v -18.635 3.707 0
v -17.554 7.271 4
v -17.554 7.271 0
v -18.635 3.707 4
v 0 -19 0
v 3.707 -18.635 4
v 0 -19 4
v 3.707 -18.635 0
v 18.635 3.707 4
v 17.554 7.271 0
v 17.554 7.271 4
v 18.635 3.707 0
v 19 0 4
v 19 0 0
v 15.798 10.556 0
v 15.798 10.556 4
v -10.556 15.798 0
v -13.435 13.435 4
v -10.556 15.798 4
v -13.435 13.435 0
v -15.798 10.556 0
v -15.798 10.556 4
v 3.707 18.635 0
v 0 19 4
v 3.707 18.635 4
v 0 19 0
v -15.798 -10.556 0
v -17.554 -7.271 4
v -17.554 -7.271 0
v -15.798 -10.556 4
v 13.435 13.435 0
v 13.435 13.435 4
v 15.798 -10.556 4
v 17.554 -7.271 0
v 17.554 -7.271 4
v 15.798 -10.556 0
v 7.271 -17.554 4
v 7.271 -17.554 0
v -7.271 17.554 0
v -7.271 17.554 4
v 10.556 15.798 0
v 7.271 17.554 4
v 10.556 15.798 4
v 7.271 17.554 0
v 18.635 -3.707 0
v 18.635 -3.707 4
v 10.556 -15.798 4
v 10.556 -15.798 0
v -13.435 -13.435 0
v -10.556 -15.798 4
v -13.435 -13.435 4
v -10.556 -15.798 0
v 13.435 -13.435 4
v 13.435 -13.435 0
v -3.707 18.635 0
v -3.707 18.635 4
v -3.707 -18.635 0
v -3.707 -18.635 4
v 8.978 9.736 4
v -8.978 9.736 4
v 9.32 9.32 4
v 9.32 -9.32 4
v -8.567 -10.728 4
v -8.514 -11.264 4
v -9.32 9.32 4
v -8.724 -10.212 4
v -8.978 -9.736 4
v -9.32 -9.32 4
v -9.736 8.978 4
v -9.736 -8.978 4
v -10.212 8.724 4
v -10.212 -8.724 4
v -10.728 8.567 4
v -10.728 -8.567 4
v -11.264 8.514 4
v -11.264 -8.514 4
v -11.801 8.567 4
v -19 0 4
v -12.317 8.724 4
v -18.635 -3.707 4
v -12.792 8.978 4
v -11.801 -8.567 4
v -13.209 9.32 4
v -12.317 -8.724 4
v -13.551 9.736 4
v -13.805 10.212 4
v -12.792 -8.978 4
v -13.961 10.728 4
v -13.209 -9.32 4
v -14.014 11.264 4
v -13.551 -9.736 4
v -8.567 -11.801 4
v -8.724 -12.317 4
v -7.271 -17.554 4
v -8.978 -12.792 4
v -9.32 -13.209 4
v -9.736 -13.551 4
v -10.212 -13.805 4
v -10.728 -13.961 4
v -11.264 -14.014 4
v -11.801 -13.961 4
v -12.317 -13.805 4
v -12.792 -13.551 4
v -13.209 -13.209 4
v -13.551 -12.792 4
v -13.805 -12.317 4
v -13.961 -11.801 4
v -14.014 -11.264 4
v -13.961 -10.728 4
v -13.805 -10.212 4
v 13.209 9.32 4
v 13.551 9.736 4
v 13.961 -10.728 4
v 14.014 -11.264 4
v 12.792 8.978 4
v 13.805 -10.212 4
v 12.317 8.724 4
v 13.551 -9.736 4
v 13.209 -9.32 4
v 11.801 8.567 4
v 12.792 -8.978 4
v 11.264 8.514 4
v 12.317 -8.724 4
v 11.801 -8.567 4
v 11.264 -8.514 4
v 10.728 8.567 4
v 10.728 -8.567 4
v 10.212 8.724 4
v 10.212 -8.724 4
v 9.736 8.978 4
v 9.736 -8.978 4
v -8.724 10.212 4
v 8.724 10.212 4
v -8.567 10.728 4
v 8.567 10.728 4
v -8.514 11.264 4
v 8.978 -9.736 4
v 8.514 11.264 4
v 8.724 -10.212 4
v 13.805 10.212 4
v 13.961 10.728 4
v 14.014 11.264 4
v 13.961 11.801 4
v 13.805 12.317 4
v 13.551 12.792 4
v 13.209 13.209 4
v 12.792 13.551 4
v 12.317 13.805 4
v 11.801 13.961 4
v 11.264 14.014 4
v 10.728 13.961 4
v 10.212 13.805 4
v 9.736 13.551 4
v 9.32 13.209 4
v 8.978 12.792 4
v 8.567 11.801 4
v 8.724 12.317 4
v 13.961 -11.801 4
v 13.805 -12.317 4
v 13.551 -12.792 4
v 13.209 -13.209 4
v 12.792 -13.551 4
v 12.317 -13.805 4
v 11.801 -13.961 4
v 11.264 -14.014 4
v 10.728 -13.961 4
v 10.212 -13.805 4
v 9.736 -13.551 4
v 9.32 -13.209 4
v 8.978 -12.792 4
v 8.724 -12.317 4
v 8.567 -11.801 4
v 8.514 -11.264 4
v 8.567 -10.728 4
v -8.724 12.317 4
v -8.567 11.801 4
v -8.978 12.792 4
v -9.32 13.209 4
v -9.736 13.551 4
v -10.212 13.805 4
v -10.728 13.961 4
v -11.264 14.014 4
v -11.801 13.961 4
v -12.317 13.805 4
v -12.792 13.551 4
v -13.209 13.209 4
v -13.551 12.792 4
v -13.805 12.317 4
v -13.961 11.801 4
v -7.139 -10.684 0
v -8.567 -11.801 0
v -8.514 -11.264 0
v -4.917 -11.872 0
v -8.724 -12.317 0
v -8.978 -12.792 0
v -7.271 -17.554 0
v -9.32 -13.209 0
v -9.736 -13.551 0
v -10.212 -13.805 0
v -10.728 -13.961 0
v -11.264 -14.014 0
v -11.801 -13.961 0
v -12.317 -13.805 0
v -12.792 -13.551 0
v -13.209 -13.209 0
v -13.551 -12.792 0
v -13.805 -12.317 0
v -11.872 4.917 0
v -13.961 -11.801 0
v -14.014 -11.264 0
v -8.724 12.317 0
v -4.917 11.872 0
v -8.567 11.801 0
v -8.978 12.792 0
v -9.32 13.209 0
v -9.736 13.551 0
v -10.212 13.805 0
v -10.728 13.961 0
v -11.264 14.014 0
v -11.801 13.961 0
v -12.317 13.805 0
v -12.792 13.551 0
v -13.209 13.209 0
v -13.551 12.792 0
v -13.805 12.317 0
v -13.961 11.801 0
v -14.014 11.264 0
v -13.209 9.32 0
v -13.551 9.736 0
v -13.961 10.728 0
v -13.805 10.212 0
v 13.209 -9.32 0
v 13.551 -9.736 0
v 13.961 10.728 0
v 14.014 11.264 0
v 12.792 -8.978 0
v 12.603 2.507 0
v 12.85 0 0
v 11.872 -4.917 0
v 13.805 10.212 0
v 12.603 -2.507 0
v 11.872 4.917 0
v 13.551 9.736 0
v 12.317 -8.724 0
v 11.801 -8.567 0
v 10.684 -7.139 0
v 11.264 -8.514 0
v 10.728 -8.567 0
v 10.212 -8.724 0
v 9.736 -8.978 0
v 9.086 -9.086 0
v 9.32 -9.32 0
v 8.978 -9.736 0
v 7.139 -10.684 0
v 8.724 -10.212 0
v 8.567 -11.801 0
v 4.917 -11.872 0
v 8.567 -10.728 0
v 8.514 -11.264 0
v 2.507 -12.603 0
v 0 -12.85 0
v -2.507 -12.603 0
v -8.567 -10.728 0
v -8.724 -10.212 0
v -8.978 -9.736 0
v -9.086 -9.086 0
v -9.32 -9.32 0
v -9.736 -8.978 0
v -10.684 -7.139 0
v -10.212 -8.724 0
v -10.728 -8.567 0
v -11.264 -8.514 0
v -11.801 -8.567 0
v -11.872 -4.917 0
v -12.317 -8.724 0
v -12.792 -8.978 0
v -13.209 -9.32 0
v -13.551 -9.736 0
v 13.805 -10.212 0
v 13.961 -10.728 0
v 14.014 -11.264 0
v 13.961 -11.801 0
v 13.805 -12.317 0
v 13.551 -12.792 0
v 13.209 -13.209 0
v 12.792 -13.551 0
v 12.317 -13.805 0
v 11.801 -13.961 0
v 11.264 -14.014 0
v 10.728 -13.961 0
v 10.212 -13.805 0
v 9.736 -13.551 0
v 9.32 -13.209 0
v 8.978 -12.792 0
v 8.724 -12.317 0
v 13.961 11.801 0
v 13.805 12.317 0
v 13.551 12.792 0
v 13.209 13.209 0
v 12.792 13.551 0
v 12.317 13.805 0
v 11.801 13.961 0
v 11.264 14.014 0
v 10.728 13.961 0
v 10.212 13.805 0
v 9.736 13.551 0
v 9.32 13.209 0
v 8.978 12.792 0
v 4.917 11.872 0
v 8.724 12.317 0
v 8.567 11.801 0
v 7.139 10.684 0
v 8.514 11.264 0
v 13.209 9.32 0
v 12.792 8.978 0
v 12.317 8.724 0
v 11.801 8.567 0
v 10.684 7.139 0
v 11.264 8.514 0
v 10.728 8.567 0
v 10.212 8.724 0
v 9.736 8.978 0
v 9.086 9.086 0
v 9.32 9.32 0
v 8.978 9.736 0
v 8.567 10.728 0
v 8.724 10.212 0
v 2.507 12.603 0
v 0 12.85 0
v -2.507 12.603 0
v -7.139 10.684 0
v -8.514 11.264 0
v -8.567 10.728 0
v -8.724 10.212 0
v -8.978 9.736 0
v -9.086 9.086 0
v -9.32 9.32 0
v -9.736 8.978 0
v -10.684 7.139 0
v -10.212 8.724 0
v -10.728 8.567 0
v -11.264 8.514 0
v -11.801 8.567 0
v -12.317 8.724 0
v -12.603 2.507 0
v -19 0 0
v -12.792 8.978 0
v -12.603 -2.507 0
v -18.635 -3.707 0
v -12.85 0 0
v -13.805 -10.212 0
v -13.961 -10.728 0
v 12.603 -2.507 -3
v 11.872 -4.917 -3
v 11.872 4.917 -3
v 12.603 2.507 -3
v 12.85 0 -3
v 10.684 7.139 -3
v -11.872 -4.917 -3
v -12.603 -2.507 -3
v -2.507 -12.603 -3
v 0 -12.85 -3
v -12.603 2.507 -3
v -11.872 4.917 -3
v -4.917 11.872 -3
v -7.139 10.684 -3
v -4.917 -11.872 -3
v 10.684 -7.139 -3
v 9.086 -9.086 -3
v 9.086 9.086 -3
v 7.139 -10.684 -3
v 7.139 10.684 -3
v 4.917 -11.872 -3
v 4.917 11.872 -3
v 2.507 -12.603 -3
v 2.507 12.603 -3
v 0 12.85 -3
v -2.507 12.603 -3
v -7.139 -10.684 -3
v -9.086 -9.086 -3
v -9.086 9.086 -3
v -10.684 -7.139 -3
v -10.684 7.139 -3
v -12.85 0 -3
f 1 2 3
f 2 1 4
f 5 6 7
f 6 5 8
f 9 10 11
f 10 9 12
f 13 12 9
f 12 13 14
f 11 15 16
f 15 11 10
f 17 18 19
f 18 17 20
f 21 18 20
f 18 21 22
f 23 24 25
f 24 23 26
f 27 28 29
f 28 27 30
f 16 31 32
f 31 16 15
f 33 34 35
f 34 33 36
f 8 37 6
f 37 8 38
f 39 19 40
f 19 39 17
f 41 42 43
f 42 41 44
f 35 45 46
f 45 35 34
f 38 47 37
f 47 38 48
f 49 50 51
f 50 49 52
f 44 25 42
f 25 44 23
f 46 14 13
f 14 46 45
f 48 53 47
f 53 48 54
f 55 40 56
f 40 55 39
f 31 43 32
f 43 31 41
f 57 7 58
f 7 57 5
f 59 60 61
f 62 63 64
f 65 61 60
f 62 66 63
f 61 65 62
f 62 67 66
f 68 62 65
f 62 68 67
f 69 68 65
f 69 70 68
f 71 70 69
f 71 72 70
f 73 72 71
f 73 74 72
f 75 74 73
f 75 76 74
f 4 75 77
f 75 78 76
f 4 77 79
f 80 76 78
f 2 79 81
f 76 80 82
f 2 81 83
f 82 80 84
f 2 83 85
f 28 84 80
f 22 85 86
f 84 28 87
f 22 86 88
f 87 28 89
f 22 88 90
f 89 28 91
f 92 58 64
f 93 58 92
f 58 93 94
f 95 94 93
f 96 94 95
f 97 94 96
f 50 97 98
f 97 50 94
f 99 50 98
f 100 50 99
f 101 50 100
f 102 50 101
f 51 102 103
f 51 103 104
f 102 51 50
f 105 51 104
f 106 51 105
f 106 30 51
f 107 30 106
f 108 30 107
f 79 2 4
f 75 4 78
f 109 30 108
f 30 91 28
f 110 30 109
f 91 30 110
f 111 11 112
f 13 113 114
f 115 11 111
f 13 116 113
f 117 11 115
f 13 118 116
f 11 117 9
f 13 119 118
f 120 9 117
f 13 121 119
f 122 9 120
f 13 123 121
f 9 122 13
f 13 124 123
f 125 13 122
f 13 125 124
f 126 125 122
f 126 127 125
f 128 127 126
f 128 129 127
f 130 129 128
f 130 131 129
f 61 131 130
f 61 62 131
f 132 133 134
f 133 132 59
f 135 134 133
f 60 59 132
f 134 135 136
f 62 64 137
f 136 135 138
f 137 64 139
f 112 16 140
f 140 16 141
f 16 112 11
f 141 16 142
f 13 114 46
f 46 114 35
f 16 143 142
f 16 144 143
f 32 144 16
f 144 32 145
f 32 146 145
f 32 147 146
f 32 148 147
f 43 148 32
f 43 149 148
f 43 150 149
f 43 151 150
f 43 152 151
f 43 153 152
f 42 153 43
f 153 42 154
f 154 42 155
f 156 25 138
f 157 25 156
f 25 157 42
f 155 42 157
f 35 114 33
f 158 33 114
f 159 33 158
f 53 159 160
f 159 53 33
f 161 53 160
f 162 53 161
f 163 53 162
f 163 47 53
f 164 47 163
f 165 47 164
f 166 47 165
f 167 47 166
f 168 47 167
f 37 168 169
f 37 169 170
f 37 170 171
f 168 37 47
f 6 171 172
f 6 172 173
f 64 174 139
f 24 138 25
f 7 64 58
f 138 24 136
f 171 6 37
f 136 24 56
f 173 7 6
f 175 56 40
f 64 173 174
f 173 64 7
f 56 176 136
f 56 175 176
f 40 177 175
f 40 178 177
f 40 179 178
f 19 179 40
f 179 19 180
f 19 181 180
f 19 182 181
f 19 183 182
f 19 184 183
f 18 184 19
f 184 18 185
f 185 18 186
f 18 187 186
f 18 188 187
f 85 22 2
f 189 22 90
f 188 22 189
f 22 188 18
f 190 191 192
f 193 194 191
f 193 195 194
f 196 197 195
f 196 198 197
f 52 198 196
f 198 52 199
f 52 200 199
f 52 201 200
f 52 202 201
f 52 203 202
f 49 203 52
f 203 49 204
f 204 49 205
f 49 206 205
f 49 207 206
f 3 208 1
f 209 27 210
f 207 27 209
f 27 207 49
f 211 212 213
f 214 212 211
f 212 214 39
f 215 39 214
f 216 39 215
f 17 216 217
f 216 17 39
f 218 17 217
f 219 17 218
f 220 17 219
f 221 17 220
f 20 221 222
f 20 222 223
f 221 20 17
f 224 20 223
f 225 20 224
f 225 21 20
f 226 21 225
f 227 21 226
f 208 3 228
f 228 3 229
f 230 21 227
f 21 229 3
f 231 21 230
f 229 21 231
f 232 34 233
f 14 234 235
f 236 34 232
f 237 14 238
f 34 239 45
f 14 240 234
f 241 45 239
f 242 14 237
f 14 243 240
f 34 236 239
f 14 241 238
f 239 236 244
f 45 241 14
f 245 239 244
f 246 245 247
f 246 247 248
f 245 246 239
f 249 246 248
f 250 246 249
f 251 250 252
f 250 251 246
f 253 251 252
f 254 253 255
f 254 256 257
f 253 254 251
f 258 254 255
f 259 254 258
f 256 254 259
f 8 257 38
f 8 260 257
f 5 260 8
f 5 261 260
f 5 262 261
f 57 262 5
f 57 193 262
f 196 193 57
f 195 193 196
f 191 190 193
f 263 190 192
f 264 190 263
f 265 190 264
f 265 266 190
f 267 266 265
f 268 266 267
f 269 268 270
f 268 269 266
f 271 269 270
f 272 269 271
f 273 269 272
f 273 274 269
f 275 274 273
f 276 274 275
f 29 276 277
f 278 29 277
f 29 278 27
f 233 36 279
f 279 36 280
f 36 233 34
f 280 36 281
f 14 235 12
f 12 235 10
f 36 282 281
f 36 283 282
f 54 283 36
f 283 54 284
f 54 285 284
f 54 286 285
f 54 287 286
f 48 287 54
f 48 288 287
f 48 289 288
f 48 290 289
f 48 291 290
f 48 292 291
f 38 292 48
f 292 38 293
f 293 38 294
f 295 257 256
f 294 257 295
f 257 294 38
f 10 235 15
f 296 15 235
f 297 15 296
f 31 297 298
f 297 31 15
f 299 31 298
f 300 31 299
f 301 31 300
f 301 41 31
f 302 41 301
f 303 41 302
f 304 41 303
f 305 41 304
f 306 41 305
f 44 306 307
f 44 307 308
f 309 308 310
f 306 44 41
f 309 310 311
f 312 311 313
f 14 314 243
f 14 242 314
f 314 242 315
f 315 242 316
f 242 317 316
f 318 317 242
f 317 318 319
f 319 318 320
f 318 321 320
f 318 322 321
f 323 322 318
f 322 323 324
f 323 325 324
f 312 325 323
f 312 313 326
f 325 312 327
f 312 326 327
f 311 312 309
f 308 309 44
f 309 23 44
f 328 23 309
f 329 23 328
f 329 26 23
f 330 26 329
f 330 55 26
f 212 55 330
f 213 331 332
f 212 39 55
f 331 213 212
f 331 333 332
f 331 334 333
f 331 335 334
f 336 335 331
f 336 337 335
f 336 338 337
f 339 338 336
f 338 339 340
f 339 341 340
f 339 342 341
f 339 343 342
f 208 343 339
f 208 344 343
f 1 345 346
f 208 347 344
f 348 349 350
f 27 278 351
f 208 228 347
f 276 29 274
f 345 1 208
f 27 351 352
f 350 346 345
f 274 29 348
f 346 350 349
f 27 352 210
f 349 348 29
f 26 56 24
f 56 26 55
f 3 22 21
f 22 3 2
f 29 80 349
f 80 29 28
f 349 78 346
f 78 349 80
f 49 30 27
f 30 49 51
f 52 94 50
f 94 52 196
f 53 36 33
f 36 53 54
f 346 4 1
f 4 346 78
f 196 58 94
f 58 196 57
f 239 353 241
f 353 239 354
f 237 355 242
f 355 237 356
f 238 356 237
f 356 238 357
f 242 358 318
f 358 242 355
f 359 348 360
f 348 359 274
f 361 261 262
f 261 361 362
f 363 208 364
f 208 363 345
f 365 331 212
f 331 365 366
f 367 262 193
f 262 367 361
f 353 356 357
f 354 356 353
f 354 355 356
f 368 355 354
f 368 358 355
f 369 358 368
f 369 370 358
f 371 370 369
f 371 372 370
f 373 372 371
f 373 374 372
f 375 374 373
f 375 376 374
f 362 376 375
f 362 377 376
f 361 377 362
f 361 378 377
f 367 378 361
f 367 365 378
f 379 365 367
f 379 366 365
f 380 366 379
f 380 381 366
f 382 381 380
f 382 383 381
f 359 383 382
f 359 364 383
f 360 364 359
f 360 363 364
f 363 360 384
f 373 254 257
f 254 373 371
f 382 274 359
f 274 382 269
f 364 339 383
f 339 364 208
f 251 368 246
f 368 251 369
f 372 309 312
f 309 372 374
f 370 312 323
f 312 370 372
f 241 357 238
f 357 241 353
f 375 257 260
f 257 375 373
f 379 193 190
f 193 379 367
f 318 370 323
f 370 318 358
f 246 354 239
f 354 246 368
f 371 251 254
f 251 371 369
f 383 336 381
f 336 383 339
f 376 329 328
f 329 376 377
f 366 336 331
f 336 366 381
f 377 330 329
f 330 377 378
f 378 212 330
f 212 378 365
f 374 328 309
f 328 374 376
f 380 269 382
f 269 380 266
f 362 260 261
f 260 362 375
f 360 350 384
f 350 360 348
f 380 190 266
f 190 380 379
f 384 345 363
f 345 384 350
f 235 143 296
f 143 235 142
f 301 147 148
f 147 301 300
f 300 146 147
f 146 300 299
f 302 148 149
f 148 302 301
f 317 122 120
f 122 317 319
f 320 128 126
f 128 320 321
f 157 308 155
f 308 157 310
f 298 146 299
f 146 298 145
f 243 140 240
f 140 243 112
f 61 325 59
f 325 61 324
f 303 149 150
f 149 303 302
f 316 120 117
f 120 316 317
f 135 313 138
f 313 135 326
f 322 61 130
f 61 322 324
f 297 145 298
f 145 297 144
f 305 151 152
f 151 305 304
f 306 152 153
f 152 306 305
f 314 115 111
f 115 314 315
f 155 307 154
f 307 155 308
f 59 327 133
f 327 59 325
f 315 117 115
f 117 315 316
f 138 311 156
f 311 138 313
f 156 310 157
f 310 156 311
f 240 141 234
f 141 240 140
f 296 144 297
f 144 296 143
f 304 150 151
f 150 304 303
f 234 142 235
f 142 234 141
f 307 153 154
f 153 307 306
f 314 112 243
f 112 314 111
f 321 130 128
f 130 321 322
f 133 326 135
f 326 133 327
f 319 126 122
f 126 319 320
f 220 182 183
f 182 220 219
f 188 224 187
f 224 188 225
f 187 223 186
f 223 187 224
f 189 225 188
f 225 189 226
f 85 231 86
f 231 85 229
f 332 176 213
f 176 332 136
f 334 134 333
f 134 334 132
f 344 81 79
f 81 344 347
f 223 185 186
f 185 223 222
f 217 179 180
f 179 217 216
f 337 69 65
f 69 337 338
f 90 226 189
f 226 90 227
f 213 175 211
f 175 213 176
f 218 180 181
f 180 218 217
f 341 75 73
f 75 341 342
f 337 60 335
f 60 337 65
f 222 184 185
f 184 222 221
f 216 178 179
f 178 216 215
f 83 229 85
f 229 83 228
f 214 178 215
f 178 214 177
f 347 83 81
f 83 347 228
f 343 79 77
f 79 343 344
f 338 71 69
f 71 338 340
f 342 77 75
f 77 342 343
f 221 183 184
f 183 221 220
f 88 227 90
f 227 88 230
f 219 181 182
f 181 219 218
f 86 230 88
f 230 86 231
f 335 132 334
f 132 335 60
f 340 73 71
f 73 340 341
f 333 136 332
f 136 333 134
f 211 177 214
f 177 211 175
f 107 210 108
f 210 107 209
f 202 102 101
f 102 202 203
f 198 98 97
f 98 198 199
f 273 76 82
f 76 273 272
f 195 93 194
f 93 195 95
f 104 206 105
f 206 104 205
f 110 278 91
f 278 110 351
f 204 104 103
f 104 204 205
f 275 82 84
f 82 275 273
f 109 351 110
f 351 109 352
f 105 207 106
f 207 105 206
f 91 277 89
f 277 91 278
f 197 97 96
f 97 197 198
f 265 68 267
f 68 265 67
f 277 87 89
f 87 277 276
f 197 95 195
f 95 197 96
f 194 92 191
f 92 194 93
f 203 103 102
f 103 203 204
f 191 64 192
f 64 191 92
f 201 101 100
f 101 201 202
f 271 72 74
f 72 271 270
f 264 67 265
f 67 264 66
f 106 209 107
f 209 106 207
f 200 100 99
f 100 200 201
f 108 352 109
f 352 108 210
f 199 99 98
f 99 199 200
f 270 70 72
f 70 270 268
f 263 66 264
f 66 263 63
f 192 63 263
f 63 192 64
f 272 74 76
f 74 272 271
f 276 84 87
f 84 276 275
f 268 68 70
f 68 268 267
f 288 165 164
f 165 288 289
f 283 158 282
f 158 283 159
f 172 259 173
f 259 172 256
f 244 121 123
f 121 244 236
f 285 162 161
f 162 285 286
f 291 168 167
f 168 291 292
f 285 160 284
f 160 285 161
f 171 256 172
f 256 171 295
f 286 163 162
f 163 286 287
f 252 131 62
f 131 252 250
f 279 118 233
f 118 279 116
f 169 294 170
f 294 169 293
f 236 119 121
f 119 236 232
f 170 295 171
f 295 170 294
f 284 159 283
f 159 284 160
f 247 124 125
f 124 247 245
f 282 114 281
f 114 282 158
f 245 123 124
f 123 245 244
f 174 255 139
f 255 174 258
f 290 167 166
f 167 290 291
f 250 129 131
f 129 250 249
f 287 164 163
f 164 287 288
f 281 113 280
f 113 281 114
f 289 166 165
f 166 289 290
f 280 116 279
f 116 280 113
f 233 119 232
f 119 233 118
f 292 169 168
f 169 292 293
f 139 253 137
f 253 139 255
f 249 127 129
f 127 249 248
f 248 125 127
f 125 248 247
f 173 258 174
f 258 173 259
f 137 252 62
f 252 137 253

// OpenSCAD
$fn = 32;

// ----------------------------------------------------------------------
// Retaining cap: 6000 cover, 38 mm, spigot 25.7 mm
// ----------------------------------------------------------------------

// --- parameters (mm) ---
plate_d = 38;             // cover diameter
plate_t = 4;              // cover thickness
boss_d = 25.7;            // spigot that enters the housing
boss_h = 3;               // spigot height
bolt_d = 5.5;             // bolt clearance
bolt_r = 15.93;           // bolt circle radius

module cover() {
  cylinder(h = plate_t, d = plate_d);
}

module spigot() {
  /* sunk 1 mm into the cover; the spigot sets the overall height */
  translate([0, 0, -boss_h]) cylinder(h = boss_h + 1, d = boss_d);
}

difference() {
  union() {
    cover();
    spigot();
  }
  for (i = [0 : 3]) rotate([0, 0, 45 + i * 90]) translate([bolt_r, 0, -boss_h - 1])
    cylinder(h = boss_h + plate_t + 2, d = bolt_d);
}
